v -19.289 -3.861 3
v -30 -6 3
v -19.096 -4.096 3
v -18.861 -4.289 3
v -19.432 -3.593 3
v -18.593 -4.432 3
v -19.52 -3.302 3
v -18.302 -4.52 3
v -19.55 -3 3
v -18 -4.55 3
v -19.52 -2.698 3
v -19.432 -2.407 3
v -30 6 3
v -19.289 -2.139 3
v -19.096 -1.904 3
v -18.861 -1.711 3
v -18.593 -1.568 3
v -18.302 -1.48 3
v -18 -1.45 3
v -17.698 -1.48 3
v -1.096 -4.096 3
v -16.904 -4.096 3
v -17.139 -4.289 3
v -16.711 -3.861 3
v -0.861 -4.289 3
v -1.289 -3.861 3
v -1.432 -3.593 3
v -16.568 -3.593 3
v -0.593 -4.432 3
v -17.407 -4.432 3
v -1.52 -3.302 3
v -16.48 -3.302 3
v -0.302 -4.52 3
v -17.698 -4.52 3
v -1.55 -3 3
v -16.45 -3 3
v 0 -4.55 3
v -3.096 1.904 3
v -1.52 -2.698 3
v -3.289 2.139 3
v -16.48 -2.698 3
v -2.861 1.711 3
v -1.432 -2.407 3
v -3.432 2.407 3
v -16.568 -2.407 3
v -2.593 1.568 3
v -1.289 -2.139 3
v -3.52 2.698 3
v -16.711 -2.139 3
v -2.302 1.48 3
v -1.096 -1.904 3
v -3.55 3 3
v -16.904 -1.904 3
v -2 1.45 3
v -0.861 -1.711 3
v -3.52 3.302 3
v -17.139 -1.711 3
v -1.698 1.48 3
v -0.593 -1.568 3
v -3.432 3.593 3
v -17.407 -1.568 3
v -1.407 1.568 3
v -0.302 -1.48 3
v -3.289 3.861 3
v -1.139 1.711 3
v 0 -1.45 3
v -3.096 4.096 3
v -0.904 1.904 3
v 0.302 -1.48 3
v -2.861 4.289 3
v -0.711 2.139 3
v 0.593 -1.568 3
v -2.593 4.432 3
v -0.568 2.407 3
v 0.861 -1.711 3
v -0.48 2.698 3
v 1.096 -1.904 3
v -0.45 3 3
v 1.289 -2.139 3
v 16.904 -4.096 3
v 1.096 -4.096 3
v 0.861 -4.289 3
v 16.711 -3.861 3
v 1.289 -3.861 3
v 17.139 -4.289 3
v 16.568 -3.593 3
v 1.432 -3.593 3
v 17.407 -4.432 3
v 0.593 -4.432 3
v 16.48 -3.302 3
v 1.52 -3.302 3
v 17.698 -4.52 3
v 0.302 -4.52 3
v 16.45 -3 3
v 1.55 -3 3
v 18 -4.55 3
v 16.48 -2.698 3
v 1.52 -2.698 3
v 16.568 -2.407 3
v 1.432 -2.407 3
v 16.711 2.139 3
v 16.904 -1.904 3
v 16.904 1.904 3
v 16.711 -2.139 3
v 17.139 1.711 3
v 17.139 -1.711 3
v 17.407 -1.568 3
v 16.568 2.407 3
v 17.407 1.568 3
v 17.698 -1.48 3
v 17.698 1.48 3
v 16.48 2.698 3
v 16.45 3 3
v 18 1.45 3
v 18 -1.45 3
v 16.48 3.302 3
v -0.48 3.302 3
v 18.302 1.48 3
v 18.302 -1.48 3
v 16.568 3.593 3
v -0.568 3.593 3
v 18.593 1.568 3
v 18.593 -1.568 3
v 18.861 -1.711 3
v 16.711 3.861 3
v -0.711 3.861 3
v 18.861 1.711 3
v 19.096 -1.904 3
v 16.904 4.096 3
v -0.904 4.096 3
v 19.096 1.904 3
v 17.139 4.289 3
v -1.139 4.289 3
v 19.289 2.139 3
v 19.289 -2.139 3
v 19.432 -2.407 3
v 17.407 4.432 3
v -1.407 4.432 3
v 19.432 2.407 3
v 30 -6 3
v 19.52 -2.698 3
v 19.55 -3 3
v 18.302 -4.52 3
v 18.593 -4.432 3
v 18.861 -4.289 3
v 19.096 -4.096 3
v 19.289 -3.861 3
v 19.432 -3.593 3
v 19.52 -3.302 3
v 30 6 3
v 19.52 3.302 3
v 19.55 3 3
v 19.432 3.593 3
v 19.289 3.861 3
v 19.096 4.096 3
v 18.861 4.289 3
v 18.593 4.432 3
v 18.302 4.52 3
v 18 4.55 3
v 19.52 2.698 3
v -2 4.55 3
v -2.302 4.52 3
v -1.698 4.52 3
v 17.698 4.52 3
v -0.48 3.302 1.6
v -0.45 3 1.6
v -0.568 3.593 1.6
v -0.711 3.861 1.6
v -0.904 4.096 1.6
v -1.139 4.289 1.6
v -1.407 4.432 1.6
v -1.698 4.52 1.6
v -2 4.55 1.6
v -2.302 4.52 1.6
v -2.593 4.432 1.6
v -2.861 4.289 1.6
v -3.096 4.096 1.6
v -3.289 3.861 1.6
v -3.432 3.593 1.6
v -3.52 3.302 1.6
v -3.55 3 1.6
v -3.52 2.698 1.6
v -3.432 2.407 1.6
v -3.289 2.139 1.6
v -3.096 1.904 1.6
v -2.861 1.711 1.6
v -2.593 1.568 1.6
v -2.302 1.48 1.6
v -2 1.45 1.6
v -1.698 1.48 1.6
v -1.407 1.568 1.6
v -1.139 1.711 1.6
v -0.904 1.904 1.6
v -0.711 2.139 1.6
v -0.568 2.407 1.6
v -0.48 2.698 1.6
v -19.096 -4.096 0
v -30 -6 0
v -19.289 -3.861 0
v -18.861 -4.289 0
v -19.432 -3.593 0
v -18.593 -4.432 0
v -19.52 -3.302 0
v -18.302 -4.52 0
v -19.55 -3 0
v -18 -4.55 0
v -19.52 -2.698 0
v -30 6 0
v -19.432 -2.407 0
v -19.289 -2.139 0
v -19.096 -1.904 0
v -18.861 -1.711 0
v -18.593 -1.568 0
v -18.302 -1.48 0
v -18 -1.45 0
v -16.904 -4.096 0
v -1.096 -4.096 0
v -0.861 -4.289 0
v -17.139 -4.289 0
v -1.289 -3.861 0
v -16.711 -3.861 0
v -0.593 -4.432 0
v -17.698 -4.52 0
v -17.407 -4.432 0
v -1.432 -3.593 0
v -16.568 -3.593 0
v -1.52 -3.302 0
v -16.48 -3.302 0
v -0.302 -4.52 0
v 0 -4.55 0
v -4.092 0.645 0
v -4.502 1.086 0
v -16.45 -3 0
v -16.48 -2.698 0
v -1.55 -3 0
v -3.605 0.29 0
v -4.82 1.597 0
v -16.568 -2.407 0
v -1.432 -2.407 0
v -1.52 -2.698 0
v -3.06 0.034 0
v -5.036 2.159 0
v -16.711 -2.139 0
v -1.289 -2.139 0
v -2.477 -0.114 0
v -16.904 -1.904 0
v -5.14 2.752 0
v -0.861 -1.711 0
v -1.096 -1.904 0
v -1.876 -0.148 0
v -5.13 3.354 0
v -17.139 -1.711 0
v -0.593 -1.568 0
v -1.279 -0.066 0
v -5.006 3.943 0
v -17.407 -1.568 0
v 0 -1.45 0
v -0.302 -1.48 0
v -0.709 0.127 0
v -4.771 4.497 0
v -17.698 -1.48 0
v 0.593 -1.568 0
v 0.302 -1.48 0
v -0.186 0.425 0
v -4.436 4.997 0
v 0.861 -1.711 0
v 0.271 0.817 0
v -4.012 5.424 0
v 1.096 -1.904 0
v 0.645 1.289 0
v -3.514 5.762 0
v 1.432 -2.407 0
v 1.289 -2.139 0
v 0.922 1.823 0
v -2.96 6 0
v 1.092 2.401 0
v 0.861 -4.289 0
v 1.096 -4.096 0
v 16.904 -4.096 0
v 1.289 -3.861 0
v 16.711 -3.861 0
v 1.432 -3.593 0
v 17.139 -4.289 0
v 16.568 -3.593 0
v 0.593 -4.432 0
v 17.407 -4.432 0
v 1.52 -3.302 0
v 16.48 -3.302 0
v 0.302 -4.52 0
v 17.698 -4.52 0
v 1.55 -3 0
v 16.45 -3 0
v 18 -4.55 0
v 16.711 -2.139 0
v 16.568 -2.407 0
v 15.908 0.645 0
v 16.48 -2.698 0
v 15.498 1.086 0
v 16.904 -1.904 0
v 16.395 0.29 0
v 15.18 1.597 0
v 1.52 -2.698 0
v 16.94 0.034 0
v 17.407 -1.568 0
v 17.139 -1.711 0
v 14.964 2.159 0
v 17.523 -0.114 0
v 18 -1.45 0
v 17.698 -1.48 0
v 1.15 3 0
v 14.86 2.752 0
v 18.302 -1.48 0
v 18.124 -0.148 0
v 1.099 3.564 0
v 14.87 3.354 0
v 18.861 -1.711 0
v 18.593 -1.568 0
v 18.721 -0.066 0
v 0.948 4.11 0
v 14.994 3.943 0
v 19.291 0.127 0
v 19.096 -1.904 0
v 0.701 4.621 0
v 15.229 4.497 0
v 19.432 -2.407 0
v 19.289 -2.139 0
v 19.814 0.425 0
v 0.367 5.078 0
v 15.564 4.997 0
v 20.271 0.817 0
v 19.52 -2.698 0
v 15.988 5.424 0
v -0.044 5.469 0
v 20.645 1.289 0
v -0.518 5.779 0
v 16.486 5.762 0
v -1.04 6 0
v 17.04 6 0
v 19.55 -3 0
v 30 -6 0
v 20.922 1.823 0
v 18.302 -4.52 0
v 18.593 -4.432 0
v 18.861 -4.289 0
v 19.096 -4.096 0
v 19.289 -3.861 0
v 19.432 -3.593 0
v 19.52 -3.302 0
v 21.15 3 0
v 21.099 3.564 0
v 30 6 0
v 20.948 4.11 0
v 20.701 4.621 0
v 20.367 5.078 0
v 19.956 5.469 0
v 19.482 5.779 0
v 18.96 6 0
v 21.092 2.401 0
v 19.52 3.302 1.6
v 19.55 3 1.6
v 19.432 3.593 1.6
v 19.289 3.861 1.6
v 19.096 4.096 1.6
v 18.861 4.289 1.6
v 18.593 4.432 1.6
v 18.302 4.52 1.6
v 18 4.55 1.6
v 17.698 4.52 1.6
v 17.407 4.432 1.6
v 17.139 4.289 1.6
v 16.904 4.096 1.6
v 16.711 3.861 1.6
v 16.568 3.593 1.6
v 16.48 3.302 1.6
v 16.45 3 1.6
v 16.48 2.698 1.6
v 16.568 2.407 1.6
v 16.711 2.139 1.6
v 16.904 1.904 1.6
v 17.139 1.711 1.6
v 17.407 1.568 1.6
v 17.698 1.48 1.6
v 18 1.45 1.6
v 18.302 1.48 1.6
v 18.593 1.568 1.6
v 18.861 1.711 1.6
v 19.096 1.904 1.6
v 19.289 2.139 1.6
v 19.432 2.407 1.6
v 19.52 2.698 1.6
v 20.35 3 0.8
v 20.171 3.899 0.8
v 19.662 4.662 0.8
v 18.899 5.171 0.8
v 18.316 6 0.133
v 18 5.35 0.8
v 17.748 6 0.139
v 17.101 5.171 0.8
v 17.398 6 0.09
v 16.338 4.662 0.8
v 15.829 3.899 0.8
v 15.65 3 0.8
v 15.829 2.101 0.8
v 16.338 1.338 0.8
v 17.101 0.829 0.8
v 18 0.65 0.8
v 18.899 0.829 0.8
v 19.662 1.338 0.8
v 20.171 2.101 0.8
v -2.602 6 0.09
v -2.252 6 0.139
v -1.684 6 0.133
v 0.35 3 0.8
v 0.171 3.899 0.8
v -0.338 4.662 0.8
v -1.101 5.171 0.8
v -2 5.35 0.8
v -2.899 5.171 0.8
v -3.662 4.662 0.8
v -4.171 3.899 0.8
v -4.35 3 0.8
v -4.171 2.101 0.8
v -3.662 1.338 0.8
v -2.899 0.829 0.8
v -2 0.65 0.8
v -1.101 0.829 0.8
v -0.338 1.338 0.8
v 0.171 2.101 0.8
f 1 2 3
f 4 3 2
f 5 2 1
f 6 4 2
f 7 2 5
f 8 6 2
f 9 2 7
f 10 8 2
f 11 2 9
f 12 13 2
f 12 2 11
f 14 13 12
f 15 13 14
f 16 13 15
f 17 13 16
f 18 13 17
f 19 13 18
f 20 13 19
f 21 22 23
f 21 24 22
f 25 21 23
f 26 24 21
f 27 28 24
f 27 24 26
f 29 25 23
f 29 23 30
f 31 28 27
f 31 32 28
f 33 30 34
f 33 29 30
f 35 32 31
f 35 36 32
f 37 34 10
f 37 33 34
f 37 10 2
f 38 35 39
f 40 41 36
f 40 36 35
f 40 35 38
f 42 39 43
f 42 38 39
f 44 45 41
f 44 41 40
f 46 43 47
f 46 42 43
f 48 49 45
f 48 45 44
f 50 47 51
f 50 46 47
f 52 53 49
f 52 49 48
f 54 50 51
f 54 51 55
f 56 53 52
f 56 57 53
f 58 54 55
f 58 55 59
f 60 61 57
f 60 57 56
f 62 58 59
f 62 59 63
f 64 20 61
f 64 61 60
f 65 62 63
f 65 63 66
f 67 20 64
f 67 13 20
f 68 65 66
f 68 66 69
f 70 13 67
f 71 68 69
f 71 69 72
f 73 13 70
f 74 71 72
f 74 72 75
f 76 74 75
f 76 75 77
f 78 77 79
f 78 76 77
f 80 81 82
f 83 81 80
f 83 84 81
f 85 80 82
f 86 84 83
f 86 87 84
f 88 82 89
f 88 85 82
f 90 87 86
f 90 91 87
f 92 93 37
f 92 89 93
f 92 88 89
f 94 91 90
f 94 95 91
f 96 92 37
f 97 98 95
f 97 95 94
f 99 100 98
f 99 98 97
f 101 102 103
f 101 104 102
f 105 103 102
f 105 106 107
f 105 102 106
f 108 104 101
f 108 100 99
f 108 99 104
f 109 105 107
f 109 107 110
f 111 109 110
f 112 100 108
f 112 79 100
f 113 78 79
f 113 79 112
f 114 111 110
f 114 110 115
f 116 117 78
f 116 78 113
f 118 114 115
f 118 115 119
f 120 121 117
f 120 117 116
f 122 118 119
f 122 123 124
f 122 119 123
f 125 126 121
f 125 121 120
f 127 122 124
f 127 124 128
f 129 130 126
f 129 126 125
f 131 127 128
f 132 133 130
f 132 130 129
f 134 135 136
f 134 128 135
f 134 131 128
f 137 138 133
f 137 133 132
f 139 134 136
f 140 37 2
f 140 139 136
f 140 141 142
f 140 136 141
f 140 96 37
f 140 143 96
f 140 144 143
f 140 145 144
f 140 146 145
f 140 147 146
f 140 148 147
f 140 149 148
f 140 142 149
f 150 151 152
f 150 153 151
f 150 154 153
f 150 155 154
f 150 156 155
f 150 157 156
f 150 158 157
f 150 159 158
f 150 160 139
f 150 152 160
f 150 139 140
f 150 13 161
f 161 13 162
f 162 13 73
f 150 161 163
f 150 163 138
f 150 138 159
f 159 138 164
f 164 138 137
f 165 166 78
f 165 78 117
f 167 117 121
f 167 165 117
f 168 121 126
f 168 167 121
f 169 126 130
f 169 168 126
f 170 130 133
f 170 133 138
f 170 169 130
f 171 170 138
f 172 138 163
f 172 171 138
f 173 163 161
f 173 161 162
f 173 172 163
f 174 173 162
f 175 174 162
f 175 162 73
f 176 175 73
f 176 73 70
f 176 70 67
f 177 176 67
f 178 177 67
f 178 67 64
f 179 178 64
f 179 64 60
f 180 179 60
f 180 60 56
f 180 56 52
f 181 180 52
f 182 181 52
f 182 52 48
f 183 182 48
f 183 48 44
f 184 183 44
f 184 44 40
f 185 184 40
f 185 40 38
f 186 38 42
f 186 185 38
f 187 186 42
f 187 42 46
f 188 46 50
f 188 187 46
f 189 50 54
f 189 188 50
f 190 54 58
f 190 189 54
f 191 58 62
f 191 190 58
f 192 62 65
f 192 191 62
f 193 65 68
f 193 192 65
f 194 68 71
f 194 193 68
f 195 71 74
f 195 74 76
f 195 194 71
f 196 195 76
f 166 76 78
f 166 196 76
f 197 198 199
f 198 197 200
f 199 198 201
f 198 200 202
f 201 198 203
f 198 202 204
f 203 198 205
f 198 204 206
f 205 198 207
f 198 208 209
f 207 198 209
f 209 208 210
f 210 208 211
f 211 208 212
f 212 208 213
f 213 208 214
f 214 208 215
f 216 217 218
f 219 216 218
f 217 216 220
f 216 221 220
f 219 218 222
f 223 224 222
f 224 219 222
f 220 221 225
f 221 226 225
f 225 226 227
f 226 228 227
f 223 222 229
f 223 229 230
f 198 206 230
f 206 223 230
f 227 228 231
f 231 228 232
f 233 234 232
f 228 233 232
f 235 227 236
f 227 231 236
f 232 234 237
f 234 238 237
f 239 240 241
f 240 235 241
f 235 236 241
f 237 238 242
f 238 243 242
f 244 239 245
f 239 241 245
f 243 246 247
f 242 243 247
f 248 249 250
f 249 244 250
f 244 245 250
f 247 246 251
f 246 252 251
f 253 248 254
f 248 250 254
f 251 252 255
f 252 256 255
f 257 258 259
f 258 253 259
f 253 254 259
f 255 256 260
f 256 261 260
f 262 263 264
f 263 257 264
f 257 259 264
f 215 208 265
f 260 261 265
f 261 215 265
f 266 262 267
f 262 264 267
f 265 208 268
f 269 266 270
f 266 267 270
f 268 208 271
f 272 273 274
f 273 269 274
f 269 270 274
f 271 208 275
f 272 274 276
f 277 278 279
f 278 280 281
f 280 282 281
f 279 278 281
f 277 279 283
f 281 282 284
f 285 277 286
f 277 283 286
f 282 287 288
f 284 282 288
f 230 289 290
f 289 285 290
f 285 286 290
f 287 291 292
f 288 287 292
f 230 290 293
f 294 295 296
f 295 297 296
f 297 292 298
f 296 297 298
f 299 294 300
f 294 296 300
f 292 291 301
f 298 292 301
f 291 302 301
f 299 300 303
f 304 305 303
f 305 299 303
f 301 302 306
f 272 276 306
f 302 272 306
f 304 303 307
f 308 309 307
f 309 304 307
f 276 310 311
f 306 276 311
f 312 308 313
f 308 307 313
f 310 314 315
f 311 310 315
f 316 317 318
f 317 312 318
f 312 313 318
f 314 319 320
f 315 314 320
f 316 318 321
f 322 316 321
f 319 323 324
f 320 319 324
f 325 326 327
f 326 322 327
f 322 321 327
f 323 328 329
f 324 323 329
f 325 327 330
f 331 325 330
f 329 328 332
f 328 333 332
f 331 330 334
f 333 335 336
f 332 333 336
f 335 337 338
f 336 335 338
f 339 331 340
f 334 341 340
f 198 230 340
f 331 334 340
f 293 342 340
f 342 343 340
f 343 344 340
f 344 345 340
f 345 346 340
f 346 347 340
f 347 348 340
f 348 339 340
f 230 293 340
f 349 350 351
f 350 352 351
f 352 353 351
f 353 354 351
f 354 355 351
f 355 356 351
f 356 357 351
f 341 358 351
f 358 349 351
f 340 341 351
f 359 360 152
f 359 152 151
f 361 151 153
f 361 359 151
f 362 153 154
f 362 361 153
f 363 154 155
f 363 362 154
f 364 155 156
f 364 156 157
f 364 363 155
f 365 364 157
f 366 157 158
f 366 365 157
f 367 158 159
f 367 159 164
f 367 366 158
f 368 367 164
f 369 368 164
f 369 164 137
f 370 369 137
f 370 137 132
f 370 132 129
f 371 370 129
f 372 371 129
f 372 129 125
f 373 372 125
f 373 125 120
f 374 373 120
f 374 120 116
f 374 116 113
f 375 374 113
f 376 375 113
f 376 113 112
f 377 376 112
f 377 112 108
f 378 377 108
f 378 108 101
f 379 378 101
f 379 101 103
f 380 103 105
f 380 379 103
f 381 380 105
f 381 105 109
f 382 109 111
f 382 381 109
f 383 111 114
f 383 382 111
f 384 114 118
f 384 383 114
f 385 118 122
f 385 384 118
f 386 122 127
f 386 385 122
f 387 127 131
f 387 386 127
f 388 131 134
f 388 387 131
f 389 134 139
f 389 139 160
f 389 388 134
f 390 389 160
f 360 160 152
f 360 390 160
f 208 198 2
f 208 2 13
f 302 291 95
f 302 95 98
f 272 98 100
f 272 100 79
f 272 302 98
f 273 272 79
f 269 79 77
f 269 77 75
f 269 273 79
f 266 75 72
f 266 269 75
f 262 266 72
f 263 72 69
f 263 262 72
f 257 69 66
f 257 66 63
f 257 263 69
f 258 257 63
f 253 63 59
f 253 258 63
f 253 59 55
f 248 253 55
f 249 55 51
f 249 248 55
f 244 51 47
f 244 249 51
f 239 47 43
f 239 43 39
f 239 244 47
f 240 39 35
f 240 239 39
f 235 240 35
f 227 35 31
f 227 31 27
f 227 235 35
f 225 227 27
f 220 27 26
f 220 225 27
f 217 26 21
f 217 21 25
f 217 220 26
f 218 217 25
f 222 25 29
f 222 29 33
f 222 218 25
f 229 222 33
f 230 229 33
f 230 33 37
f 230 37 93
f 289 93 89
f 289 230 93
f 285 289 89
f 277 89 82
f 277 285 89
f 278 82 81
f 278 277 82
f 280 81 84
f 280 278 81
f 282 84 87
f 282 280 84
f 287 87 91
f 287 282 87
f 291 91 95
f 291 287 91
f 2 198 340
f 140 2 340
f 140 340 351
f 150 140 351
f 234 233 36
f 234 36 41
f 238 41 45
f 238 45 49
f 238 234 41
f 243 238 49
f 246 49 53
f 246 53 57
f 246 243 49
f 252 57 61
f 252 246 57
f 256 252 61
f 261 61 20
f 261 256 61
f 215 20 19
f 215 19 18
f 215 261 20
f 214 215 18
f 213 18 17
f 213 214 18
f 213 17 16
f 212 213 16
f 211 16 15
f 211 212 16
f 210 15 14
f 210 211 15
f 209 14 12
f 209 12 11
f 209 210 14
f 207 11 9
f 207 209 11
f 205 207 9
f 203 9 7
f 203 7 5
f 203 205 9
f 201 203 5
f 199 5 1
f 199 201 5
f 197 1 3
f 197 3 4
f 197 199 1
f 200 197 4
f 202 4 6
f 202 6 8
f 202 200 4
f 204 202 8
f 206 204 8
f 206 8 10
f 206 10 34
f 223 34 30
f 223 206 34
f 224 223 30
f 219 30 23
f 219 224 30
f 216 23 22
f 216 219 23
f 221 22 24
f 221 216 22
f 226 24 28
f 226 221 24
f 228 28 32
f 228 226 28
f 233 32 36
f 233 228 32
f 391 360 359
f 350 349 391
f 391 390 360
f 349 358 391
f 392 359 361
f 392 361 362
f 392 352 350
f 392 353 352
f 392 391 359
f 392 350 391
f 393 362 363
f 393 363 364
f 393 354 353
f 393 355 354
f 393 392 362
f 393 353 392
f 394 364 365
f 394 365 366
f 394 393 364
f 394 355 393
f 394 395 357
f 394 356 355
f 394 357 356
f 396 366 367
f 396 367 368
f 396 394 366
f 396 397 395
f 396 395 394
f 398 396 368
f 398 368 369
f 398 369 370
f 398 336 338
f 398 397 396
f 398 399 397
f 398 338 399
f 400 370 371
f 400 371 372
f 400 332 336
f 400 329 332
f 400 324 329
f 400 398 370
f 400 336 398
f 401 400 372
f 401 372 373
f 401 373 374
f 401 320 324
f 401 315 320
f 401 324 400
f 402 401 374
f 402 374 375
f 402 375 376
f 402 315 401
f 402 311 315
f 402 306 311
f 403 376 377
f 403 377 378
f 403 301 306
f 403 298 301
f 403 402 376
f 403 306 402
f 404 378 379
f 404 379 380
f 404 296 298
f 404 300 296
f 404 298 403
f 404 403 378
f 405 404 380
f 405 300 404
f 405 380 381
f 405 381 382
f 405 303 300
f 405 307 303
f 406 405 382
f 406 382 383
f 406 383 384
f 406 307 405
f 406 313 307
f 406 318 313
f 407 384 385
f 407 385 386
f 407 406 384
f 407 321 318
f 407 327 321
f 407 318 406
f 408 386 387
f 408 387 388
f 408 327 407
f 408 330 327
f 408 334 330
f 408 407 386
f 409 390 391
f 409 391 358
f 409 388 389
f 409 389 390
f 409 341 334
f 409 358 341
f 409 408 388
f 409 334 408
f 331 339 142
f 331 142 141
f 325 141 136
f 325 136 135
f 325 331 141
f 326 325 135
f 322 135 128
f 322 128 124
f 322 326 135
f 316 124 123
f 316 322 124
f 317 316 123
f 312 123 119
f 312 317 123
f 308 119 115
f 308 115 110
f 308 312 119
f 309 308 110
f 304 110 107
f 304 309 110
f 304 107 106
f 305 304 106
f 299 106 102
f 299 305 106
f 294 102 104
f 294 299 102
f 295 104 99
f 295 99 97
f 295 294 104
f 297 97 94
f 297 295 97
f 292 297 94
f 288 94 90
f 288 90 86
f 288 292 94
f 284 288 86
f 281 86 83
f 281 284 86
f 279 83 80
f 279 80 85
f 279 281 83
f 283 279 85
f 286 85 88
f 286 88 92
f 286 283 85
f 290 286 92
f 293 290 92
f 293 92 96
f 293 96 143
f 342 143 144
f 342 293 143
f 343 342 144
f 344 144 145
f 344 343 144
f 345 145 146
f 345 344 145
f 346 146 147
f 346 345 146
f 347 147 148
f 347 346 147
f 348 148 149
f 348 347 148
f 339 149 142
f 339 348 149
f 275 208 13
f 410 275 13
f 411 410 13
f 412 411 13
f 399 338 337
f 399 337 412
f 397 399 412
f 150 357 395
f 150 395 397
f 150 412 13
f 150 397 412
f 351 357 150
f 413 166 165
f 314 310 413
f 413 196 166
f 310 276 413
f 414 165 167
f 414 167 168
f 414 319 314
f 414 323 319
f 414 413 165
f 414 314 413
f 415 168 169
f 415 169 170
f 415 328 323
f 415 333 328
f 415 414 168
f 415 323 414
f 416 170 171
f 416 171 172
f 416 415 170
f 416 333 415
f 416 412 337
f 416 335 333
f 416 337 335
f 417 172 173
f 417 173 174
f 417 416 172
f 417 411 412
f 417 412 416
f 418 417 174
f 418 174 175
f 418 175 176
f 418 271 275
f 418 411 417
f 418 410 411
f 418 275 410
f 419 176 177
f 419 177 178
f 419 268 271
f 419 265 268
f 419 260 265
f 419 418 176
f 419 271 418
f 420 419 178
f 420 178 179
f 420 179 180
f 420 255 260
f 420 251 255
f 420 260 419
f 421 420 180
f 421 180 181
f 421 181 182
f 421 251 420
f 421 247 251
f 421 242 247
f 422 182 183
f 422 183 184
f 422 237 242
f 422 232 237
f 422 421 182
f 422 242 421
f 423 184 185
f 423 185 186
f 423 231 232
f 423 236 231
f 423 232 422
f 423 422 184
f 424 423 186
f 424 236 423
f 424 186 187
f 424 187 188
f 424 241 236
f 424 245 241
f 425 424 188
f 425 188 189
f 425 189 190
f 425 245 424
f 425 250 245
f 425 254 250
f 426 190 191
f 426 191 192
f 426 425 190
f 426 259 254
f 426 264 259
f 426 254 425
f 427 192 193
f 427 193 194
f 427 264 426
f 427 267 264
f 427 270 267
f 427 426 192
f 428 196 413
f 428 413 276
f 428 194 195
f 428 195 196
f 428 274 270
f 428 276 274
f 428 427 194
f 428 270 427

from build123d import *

# Parameters (mm, degrees)
SKETCH_1_W      = 60
SKETCH_1_H      = 12
SKETCH_1_R      = 1.55
EXTRUDE_1_DEPTH = 3
CHAMFER_1_SIZE  = 1.6


with BuildPart() as part:
    # 草图1 → 凸台-拉伸1 (new body)
    with BuildSketch(Plane.XY):
        Rectangle(SKETCH_1_W, SKETCH_1_H)
        with Locations((18, 3)):
            Circle(SKETCH_1_R, mode=Mode.SUBTRACT)
        with Locations((-2, 3)):
            Circle(SKETCH_1_R, mode=Mode.SUBTRACT)
        with Locations((0, -3)):
            Circle(SKETCH_1_R, mode=Mode.SUBTRACT)
        with Locations((18, -3)):
            Circle(SKETCH_1_R, mode=Mode.SUBTRACT)
        with Locations((-18, -3)):
            Circle(SKETCH_1_R, mode=Mode.SUBTRACT)
    extrude(amount=EXTRUDE_1_DEPTH)

    # 倒角1
    # the kernel refuses this chamfer: 1.6 mm, written as the material it takes off along each edge
    with BuildSketch(Plane(origin=(18, 3, 0), x_dir=(1, 0, 0), z_dir=(0, -1, 0))) as chamfer_1_piece_1:
        Polygon((1.55, CHAMFER_1_SIZE), (1.55 + CHAMFER_1_SIZE, 0), (1.55, 0), align=None)
    revolve(axis=Axis((18, 3, 0), (0, 0, 1)), mode=Mode.SUBTRACT)
    with BuildSketch(Plane(origin=(-2, 3, 0), x_dir=(1, 0, 0), z_dir=(0, -1, 0))) as chamfer_1_piece_2:
        Polygon((1.55, CHAMFER_1_SIZE), (1.55 + CHAMFER_1_SIZE, 0), (1.55, 0), align=None)
    revolve(axis=Axis((-2, 3, 0), (0, 0, 1)), mode=Mode.SUBTRACT)


solid = part.part
